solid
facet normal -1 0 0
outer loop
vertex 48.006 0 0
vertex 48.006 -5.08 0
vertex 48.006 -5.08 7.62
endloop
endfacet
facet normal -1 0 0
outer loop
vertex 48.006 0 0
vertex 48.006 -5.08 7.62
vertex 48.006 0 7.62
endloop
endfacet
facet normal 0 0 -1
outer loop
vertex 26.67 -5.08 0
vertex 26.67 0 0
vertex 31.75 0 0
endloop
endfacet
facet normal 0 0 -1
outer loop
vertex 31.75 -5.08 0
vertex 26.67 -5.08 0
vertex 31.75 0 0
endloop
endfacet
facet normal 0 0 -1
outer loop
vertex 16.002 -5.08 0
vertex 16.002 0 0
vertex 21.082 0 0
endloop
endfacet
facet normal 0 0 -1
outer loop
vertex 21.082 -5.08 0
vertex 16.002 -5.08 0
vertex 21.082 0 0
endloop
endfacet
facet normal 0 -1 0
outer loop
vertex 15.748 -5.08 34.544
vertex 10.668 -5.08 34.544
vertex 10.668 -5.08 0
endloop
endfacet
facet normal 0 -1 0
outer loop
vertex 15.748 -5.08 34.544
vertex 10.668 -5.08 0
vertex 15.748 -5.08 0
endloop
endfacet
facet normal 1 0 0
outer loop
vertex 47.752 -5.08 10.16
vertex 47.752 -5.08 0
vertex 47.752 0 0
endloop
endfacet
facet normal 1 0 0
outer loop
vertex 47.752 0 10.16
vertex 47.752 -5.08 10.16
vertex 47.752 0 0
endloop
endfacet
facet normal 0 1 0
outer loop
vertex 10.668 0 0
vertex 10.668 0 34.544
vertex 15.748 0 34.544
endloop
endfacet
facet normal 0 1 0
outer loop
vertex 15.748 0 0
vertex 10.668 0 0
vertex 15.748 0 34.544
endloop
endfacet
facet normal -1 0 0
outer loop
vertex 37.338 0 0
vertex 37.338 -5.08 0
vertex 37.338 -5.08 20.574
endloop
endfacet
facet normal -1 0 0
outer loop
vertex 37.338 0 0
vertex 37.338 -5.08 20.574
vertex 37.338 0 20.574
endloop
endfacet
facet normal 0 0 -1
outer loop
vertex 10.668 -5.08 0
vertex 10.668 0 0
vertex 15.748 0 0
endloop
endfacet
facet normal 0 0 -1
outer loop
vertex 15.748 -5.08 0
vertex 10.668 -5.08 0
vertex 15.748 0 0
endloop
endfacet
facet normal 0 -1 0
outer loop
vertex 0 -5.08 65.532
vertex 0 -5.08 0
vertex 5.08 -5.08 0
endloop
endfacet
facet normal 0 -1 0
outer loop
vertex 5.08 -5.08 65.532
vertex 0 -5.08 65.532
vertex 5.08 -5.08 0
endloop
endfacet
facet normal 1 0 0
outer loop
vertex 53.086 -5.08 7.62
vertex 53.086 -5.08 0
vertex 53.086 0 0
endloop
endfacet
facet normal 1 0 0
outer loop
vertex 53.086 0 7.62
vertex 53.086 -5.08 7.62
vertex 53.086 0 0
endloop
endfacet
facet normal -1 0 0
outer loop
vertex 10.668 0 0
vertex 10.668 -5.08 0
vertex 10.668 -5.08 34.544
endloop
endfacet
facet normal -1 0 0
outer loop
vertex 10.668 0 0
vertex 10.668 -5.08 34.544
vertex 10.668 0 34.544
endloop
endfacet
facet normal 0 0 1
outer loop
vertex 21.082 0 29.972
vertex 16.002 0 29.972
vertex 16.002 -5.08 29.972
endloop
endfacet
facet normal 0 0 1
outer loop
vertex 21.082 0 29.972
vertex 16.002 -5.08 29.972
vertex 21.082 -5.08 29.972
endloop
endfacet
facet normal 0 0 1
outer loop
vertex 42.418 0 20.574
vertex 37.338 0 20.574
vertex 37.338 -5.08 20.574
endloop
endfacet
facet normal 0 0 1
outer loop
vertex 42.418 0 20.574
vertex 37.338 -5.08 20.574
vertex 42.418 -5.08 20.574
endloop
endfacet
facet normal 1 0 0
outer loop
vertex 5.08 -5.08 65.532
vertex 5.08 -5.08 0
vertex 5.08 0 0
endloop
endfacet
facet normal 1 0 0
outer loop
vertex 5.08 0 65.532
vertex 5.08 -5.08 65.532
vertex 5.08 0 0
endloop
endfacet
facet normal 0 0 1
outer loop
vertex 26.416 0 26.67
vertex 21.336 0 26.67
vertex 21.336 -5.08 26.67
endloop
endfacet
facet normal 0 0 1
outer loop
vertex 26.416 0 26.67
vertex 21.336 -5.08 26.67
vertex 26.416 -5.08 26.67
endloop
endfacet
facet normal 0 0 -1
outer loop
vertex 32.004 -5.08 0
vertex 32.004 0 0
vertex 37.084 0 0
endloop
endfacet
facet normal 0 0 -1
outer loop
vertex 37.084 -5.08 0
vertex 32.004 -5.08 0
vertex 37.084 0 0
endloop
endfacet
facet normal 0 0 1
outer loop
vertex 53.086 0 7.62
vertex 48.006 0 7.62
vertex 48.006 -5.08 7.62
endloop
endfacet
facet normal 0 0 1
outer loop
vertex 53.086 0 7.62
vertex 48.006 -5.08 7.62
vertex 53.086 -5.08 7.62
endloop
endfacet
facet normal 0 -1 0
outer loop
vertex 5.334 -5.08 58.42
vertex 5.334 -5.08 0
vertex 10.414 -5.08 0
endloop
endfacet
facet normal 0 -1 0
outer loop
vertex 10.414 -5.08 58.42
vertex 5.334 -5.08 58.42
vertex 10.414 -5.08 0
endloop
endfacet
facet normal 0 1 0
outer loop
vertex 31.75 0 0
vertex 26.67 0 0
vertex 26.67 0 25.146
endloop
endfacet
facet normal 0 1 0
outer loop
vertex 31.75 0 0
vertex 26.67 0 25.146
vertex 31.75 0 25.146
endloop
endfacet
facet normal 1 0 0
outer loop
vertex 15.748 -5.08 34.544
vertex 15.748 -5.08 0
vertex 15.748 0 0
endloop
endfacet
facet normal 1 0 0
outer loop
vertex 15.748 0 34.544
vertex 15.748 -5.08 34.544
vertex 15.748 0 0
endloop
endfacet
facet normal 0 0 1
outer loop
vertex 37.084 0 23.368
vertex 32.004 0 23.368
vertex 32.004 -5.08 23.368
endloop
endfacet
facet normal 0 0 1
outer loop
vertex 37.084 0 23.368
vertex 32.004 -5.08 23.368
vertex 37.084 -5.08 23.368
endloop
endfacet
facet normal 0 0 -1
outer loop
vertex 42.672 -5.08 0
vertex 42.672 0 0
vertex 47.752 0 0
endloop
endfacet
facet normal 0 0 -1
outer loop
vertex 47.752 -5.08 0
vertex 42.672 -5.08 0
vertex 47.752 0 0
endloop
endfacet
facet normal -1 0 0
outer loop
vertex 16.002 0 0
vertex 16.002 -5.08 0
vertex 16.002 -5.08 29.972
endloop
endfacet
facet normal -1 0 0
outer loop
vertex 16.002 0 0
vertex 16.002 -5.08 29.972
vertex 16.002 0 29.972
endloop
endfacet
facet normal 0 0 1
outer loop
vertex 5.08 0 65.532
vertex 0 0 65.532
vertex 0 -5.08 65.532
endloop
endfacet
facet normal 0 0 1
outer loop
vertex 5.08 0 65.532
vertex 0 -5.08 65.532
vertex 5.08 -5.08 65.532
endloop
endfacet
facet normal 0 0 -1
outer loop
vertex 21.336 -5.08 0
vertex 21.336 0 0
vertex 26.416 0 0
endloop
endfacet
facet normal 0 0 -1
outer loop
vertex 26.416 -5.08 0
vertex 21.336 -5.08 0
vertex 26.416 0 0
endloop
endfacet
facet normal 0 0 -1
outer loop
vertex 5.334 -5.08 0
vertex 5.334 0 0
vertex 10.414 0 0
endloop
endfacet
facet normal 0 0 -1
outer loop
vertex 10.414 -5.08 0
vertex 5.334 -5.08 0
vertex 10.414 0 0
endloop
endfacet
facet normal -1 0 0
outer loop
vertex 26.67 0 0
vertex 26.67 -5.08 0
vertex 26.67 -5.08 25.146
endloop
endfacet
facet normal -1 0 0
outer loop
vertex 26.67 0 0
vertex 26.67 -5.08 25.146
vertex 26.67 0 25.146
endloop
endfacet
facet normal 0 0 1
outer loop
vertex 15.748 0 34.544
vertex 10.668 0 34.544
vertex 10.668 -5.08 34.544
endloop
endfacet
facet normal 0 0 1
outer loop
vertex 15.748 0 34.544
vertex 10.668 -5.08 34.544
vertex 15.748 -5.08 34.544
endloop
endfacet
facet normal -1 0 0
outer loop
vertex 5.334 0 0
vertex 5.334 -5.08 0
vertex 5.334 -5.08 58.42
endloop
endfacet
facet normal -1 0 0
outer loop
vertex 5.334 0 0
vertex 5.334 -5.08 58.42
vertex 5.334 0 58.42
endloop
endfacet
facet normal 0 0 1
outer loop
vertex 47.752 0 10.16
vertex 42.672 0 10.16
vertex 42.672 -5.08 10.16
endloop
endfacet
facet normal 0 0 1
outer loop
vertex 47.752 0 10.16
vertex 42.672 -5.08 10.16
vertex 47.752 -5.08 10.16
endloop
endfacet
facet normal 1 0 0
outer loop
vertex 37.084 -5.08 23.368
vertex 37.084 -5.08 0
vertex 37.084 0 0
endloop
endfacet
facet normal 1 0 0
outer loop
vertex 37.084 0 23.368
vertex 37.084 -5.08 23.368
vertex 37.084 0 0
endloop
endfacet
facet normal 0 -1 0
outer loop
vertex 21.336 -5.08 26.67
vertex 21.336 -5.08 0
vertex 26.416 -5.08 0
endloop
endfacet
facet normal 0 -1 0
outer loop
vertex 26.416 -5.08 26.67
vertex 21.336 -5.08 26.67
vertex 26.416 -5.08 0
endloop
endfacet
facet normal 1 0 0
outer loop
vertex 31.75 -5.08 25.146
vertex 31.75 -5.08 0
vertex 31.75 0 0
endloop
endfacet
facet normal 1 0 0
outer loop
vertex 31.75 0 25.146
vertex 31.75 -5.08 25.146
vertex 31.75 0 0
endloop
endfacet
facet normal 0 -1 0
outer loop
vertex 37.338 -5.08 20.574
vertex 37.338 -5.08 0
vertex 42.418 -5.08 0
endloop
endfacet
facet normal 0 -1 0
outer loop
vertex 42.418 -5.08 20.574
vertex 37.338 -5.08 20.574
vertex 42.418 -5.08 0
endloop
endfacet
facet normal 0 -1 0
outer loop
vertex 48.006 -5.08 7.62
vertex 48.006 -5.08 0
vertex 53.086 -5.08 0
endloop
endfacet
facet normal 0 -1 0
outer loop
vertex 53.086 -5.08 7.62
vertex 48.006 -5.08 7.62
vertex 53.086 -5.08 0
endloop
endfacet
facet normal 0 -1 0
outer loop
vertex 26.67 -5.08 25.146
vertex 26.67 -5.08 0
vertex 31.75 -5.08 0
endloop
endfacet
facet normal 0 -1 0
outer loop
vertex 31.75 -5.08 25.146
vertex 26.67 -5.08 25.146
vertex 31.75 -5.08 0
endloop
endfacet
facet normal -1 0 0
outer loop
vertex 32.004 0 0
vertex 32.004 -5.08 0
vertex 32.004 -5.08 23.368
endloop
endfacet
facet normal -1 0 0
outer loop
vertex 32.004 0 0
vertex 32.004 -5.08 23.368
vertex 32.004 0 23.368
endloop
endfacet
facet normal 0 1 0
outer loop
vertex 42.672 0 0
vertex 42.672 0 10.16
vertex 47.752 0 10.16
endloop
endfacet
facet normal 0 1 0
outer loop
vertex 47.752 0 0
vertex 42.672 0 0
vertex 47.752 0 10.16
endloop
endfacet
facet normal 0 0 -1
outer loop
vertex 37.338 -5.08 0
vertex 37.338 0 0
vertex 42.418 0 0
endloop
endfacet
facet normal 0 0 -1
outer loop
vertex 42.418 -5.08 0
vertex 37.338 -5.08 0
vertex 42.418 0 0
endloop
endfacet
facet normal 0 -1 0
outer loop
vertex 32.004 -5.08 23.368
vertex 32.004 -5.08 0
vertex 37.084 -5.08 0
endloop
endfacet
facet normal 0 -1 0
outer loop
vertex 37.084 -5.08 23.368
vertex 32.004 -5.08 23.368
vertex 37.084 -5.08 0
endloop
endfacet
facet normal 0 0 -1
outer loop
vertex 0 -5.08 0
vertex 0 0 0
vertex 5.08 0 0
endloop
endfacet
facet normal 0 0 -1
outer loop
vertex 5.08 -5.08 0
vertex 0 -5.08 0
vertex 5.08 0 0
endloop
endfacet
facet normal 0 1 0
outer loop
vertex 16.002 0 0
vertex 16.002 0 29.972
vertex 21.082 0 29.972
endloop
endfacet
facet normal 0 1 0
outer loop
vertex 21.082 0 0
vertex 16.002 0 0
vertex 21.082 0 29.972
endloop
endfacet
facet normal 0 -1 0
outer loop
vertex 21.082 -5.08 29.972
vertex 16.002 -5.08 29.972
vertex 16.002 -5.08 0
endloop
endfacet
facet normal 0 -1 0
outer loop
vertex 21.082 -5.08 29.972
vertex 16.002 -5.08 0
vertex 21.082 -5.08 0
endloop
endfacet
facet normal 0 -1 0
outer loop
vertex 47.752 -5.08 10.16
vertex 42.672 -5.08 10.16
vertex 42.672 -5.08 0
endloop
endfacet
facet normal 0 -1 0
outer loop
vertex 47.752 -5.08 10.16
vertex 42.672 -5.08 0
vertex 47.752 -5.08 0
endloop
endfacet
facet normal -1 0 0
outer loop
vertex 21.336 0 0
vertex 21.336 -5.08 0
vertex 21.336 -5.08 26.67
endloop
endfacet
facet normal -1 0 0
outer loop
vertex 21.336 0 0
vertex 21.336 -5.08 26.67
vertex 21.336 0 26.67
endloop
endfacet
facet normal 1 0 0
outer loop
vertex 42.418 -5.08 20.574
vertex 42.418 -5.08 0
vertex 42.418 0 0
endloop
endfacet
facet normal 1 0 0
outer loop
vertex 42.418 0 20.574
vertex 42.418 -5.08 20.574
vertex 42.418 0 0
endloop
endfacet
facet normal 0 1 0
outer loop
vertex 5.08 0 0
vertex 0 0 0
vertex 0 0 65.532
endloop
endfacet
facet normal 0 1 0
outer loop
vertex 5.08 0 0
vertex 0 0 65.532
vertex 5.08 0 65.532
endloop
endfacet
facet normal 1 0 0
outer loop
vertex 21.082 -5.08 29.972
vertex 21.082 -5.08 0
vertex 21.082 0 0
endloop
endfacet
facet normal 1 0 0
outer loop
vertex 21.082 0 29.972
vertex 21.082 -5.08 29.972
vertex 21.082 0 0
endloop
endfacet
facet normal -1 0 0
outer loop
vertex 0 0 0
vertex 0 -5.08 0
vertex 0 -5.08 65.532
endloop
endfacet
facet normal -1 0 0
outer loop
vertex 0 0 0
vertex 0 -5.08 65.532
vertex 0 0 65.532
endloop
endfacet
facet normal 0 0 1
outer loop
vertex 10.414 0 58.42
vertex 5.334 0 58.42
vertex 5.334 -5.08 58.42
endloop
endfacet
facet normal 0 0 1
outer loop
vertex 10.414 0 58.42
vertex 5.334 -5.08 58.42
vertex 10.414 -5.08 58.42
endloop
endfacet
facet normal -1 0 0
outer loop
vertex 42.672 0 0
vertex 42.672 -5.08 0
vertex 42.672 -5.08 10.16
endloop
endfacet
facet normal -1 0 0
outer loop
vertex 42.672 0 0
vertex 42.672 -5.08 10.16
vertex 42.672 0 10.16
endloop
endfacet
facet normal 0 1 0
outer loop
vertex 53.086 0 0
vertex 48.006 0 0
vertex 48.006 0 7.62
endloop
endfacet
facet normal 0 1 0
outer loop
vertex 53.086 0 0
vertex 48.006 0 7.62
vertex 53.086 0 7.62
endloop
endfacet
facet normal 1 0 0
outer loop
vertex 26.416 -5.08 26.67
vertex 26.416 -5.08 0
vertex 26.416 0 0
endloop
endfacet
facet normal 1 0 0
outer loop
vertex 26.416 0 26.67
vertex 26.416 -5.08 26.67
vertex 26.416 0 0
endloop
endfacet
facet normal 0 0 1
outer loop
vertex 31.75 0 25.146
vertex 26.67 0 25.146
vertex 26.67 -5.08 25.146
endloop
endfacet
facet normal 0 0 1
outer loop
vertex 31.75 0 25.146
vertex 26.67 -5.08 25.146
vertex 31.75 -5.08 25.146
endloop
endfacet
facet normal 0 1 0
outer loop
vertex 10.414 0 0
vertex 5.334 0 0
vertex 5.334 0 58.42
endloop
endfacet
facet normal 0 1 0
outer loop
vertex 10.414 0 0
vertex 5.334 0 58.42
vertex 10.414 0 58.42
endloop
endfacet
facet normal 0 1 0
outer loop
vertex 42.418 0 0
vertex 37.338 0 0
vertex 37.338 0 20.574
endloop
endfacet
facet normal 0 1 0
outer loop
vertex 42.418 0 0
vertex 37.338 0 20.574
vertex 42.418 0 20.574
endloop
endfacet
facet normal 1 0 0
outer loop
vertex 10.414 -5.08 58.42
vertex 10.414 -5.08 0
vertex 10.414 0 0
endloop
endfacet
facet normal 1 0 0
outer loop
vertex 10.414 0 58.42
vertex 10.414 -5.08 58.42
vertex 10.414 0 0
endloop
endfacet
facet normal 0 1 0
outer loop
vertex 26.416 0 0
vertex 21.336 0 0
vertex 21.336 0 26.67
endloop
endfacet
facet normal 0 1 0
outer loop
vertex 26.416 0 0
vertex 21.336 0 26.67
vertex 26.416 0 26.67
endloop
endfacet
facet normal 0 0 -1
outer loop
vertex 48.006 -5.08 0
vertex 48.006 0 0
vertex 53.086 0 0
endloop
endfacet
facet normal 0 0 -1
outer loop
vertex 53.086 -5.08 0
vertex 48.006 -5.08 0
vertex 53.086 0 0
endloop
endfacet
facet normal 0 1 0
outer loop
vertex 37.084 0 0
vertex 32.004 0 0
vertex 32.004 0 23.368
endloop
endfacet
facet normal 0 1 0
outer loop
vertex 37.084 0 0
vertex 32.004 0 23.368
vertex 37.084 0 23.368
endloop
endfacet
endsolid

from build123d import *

# Parameters (mm, degrees)
F0_W      = 5.08
F0_H      = 5.08
F2_DEPTH  = 65.532
F1_W      = 5.08
F1_H      = 5.08
F3_DEPTH  = 58.42
F4_DEPTH  = 34.544
F5_DEPTH  = 29.972
F6_DEPTH  = 26.67
F7_DEPTH  = 25.146
F8_DEPTH  = 23.368
F9_DEPTH  = 20.574
F10_DEPTH = 10.16
F11_DEPTH = 7.62


with BuildPart() as f2:
    # F0 (on Top) → F2 (new body)
    with BuildSketch(Plane.XY):
        with Locations((2.54, -2.54)):
            Rectangle(F0_W, F0_H)
    extrude(amount=F2_DEPTH)


with BuildPart() as f3:
    # F1 (on Top) → F3 (new body)
    with BuildSketch(Plane.XY):
        with Locations((7.874, -2.54)):
            Rectangle(F1_W, F1_H)
    extrude(amount=F3_DEPTH)


with BuildPart() as f4:
    # F1 (on Top) → F4 (new body)
    with BuildSketch(Plane.XY):
        with Locations((13.208, -2.54)):
            Rectangle(F1_W, F1_H)
    extrude(amount=F4_DEPTH)


with BuildPart() as f5:
    # F1 (on Top) → F5 (new body)
    with BuildSketch(Plane.XY):
        with Locations((18.542, -2.54)):
            Rectangle(F1_W, F1_H)
    extrude(amount=F5_DEPTH)


with BuildPart() as f6:
    # F1 (on Top) → F6 (new body)
    with BuildSketch(Plane.XY):
        with Locations((23.876, -2.54)):
            Rectangle(F1_W, F1_H)
    extrude(amount=F6_DEPTH)


with BuildPart() as f7:
    # F1 (on Top) → F7 (new body)
    with BuildSketch(Plane.XY):
        with Locations((29.21, -2.54)):
            Rectangle(F1_W, F1_H)
    extrude(amount=F7_DEPTH)


with BuildPart() as f8:
    # F1 (on Top) → F8 (new body)
    with BuildSketch(Plane.XY):
        with Locations((34.544, -2.54)):
            Rectangle(F1_W, F1_H)
    extrude(amount=F8_DEPTH)


with BuildPart() as f9:
    # F1 (on Top) → F9 (new body)
    with BuildSketch(Plane.XY):
        with Locations((39.878, -2.54)):
            Rectangle(F1_W, F1_H)
    extrude(amount=F9_DEPTH)


with BuildPart() as f10:
    # F1 (on Top) → F10 (new body)
    with BuildSketch(Plane.XY):
        with Locations((45.212, -2.54)):
            Rectangle(F1_W, F1_H)
    extrude(amount=F10_DEPTH)


with BuildPart() as f11:
    # F1 (on Top) → F11 (new body)
    with BuildSketch(Plane.XY):
        with Locations((50.546, -2.54)):
            Rectangle(F1_W, F1_H)
    extrude(amount=F11_DEPTH)


solid = Compound([f2.part, f3.part, f4.part, f5.part, f6.part, f7.part, f8.part, f9.part, f10.part, f11.part])
